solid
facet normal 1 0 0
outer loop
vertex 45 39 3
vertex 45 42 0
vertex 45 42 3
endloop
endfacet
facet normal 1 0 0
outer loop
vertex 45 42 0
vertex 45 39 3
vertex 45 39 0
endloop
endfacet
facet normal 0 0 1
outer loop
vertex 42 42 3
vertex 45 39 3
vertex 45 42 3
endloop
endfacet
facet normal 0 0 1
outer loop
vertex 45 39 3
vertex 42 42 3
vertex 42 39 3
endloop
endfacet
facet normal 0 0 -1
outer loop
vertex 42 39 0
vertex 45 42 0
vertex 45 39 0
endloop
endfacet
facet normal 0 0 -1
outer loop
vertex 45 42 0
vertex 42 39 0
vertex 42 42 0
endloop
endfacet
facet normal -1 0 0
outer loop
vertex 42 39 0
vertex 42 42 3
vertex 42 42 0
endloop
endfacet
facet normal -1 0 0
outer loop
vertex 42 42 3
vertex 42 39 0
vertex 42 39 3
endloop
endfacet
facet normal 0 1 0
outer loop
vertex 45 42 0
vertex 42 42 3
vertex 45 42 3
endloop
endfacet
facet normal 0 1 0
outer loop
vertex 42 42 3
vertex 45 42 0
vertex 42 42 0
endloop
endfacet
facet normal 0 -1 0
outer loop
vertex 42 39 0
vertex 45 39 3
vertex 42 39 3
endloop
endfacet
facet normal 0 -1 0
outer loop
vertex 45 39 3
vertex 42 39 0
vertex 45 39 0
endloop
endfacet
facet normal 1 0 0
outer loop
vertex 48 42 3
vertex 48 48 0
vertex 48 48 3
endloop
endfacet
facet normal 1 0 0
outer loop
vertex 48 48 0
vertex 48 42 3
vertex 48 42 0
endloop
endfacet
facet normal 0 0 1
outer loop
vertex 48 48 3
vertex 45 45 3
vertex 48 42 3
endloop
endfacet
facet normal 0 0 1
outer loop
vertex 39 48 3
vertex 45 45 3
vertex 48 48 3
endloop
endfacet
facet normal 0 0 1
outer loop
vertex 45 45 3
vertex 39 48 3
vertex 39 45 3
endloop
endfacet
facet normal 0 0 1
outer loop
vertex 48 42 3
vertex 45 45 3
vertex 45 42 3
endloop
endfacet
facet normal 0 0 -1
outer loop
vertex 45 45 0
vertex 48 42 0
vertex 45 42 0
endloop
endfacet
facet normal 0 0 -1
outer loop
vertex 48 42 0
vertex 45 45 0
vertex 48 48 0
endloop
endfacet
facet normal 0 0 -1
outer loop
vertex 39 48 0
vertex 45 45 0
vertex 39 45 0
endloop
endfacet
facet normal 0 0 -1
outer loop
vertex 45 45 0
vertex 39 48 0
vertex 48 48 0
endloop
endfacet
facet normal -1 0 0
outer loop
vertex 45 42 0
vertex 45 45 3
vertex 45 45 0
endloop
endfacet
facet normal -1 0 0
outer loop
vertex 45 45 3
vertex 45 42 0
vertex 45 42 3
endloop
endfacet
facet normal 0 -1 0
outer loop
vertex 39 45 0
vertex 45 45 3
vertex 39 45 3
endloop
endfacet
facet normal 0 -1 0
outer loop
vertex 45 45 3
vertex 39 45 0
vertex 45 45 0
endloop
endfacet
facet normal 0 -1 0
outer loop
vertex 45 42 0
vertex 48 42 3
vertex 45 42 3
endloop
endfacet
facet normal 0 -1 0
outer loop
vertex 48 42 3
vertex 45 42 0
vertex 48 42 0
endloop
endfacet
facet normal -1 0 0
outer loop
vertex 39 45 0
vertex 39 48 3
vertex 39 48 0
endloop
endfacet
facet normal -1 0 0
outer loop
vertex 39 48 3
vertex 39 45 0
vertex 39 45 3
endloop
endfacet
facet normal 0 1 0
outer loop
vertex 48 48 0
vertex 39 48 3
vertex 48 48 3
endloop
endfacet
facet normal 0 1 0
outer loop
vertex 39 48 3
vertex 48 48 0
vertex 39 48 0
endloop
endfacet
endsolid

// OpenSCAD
// cgol_animation.scad — fast preview animation in OpenSCAD
// Usage: enable OpenSCAD’s Design → Animate (e.g. FPS=8, Steps=80)

// Parameters
fps        = 10;     // Preview frames per second
max_steps  = 80;     // How many generations to cycle through
cell       = 3;      // Cell edge length (mm)
width      = 30;     // Grid width
height     = 30;     // Grid height

// Helper functions

// Sum of a list (tail-recursive)
function sum(v, i=0, acc=0) = (i == len(v)) ? acc : sum(v, i+1, acc + v[i]);

// Count neighbors via list comprehension (toroidal wrap)
function count_n(g, x, y) =
    let(
        terms = [
            for (dy = [-1:1], dx = [-1:1])
                if (!(dx == 0 && dy == 0))
                    g[(y+dy+height)%height][(x+dx+width)%width]
        ]
    )
    sum(terms);

// Compute next generation
function next_grid(g) =
    [
        for (y = [0:height-1]) [
            for (x = [0:width-1])
                let(n = count_n(g, x, y))
                ((g[y][x] == 1 && (n == 2 || n == 3)) || (g[y][x] == 0 && n == 3)) ? 1 : 0
        ]
    ];

// Recursively get the nth generation
function gen_at(g, n) = (n == 0) ? g : gen_at(next_grid(g), n-1);

// List of all alive-cell coordinates (for sparse rendering)
function alive_coords(g) = [
    for (y = [0:height-1], x = [0:width-1])
        if (g[y][x] == 1) [x, y]
];

// Render only living cells as cubes
module render_alive(coords) {
    for (p = coords)
        translate([p[0]*cell, p[1]*cell, 0])
            cube(cell, center=false);
}

// Initial pattern (seed)

function gen0_cell(x,y) =
    let(gx = floor(width/2)-2, gy = floor(height/2)-2)
    (
        // Glider
        (x==gx+1 && y==gy) ||
        (x==gx+2 && y==gy+1) ||
        (x==gx   && y==gy+2) ||
        (x==gx+1 && y==gy+2) ||
        (x==gx+2 && y==gy+2)
    ) ? 1 : 0;

gen0 = [ for (y=[0:height-1]) [ for (x=[0:width-1]) gen0_cell(x,y) ] ];


// Animate via $t

gen_idx  = floor($t * fps) % max_steps;
current  = gen_at(gen0, gen_idx);
coords   = alive_coords(current);

// Output
render_alive(coords);
